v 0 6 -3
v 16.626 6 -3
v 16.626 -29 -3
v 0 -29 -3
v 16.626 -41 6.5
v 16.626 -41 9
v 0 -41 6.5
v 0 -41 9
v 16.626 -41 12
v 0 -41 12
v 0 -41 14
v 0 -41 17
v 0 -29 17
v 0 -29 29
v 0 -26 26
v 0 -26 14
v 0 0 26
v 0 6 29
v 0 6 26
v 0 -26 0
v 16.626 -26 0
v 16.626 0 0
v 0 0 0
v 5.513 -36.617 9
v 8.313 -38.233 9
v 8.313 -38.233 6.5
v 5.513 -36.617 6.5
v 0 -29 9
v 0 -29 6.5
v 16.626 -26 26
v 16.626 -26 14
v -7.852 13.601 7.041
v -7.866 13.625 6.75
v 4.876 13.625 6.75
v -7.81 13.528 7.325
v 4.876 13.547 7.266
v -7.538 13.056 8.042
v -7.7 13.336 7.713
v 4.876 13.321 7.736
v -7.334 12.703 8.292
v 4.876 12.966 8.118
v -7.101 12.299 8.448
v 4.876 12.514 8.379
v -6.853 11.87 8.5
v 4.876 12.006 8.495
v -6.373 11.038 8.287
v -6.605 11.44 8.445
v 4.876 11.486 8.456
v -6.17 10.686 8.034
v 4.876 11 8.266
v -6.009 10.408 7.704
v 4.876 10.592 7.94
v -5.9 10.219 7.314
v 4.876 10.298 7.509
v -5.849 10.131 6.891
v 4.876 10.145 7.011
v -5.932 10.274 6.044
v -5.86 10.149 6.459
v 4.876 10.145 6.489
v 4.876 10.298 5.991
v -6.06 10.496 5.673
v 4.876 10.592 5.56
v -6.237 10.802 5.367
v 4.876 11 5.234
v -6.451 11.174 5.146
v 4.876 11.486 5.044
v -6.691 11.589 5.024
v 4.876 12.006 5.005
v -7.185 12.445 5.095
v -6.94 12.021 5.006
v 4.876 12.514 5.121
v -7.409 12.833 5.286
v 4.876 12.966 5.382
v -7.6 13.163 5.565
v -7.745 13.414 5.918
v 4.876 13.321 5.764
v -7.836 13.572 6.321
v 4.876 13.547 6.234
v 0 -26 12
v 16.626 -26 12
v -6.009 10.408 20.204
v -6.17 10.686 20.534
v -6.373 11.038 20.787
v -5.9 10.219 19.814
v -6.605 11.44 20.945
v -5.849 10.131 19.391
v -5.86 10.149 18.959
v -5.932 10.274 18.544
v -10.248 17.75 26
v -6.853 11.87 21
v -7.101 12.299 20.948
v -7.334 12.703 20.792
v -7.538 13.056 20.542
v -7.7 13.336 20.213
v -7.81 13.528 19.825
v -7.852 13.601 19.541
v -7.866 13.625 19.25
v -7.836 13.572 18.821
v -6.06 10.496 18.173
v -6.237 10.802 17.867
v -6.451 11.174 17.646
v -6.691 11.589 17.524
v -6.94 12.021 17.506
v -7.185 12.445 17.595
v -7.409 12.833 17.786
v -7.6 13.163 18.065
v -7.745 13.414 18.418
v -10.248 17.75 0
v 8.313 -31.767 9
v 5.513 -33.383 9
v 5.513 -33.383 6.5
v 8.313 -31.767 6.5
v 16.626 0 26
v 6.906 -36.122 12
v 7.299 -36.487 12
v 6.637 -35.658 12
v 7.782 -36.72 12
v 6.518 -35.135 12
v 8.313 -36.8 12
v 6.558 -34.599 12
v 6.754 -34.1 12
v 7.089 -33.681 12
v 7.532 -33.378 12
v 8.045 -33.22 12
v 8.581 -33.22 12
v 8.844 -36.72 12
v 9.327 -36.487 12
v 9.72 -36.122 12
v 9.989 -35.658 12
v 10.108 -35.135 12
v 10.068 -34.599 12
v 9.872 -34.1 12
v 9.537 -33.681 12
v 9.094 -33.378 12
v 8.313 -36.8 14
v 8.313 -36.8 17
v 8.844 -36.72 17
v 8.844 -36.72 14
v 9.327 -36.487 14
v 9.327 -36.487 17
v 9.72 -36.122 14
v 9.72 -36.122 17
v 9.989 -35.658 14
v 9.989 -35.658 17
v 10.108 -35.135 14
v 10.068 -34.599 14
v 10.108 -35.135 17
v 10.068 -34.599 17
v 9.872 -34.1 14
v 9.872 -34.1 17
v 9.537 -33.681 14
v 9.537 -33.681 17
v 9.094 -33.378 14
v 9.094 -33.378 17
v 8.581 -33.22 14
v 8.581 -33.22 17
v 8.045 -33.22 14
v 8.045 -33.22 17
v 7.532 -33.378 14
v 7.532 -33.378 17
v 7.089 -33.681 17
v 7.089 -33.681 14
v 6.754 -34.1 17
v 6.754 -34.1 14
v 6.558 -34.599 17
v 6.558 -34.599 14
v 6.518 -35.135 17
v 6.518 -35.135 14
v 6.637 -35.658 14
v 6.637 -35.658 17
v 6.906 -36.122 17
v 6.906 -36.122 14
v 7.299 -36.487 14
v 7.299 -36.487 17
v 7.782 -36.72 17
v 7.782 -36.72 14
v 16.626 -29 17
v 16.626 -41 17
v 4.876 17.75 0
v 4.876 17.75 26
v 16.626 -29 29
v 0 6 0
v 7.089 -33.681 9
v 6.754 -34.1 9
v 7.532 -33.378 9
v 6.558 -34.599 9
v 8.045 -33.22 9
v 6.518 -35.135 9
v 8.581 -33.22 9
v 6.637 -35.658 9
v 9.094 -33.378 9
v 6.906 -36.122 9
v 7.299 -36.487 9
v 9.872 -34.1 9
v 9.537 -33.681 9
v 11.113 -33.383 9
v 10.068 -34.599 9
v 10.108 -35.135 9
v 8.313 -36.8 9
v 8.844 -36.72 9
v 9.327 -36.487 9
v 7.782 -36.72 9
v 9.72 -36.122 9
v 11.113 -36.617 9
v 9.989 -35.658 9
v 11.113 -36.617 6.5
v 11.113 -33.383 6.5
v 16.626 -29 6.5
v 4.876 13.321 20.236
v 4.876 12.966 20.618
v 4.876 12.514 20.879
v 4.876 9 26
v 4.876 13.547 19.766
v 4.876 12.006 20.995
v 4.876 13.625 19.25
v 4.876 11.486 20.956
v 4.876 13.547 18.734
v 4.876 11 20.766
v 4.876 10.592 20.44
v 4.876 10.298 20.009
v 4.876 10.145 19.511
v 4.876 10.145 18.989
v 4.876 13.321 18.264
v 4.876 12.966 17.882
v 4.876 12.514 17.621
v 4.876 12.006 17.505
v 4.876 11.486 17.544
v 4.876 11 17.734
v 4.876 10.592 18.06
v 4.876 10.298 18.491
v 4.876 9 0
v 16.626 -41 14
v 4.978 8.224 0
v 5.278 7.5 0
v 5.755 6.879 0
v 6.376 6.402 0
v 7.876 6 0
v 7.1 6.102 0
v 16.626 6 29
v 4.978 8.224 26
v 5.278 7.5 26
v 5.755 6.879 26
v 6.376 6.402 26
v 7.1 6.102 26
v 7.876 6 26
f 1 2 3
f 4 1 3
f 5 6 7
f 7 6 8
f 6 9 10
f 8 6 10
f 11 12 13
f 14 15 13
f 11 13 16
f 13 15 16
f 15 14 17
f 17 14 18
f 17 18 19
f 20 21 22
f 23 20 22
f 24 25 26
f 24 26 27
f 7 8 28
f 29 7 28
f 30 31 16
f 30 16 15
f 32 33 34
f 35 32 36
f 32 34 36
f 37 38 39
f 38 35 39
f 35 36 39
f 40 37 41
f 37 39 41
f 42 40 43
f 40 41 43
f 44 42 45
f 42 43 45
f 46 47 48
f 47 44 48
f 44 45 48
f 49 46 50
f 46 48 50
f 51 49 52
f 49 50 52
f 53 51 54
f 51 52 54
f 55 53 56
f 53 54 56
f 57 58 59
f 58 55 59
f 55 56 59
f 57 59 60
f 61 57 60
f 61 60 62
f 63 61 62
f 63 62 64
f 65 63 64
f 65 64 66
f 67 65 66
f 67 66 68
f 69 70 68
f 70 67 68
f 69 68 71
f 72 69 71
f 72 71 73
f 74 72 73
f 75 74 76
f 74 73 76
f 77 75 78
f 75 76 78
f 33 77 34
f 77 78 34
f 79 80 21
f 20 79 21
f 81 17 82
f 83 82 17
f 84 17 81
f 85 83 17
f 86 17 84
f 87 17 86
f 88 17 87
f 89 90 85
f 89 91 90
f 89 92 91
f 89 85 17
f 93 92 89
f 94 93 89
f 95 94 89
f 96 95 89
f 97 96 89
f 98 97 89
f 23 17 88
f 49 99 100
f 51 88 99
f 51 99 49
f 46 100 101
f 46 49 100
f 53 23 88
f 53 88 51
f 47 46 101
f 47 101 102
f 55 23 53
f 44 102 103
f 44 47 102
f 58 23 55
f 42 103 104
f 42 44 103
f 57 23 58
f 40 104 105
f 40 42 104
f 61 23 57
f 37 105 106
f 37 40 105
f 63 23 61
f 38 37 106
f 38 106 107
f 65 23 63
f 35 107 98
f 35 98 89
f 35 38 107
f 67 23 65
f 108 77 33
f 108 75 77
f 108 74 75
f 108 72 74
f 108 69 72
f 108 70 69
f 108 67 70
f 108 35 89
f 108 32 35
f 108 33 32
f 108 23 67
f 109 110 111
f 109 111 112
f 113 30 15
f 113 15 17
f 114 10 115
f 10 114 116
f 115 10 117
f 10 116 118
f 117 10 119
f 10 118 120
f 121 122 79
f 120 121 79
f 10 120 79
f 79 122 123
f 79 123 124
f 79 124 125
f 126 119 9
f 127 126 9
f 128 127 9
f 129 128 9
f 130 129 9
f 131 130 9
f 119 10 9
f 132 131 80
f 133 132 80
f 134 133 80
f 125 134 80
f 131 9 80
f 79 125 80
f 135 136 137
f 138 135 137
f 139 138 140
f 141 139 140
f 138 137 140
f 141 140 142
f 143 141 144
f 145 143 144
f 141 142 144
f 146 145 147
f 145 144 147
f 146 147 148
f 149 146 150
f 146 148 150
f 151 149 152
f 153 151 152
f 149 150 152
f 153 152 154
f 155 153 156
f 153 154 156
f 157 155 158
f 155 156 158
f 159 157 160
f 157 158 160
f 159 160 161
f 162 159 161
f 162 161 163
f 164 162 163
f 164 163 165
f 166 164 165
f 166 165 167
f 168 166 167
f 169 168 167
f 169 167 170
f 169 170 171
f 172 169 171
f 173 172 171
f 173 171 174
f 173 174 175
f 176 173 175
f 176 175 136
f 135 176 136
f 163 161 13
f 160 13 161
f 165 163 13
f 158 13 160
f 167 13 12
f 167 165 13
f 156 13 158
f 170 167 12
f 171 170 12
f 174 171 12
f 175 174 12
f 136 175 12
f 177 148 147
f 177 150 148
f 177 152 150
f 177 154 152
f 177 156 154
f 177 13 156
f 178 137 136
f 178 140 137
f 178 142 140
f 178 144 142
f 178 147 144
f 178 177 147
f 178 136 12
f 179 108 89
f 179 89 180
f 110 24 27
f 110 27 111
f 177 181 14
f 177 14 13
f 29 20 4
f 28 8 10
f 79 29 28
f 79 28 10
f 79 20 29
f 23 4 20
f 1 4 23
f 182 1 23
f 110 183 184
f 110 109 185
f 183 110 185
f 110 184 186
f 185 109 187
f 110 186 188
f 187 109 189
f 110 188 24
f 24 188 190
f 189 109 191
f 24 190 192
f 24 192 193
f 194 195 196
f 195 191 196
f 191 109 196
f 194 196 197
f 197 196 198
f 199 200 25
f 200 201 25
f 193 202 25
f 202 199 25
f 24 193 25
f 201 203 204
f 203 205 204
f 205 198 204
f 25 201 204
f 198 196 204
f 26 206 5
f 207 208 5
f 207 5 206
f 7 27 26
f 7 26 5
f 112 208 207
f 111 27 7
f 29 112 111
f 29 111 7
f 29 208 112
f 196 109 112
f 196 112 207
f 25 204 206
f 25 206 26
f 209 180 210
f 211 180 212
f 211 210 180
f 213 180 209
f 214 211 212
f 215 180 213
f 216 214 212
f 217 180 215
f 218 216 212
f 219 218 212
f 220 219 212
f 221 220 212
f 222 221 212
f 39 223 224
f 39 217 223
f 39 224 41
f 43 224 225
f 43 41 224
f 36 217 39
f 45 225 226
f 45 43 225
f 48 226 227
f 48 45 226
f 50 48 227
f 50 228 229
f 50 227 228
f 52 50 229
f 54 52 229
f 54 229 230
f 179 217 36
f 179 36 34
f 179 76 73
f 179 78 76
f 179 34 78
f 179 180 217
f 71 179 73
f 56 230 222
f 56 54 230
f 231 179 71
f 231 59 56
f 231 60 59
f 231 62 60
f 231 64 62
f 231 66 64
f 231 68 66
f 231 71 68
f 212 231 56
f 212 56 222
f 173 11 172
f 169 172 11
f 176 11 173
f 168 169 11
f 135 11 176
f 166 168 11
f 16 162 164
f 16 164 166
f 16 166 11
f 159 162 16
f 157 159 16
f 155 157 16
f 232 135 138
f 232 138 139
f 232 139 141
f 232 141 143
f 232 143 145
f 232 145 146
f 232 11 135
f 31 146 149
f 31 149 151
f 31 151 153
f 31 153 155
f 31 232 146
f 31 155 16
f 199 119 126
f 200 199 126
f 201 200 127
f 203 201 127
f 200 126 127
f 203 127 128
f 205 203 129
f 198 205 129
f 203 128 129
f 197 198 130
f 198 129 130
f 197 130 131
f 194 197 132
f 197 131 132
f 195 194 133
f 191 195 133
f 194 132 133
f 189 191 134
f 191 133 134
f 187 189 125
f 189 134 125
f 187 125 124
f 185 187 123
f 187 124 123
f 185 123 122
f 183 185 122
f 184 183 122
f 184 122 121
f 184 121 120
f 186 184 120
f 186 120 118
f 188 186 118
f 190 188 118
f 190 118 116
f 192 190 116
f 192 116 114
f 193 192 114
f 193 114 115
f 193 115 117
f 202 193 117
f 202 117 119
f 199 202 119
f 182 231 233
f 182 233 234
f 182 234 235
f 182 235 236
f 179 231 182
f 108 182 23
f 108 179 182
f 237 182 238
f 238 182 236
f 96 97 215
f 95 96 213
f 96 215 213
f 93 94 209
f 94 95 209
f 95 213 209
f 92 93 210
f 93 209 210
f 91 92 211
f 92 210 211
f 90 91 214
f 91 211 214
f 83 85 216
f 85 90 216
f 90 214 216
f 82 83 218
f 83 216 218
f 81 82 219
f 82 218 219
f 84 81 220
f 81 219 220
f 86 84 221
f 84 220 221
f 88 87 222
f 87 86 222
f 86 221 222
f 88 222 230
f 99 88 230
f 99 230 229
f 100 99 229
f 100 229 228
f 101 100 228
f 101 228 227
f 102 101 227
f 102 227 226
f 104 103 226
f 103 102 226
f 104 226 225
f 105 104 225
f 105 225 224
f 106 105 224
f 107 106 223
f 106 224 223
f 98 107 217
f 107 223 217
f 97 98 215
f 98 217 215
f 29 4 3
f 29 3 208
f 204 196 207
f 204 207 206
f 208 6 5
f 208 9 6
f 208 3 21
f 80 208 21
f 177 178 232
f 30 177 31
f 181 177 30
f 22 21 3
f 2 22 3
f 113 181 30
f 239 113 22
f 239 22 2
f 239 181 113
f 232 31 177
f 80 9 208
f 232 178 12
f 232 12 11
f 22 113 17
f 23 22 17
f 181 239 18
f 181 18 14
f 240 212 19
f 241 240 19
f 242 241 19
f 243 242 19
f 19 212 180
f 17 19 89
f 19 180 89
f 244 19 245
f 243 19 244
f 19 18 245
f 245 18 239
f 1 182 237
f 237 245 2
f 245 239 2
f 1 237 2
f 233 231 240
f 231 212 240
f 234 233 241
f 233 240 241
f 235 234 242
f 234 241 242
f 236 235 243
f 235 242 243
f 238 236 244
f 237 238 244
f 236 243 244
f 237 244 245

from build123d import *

# Parameters (mm, degrees)
BOSS_EXTRUDE1_DEPTH = 26
SKETCH3_R           = 1.75
CUT_EXTRUDE2_DEPTH  = 35.925597792
FILLET1_R           = 3
BOSS_EXTRUDE2_DEPTH = 16.626016
SKETCH5_R           = 1.8
CUT_EXTRUDE3_DEPTH  = 49.553315232
SKETCH6_W           = 16.626016361
SKETCH6_H           = 12
BOSS_EXTRUDE3_DEPTH = 2.5


with BuildPart() as part:
    # Sketch1 → Boss-Extrude1 (new body)
    with BuildSketch(Plane.XY):
        Polygon((0, 0), (-10.247967278, 17.75), (4.876016361, 17.75), (4.876016361, 6), (16.626016361, 6), (16.626016361, 0), align=None)
    extrude(amount=BOSS_EXTRUDE1_DEPTH)

    # Sketch3 → Cut-Extrude2 (cut, through all)
    with BuildSketch(Plane(origin=(4.876016361, 0, 0), x_dir=(0, 0, -1), z_dir=(1, 0, 0))):
        with Locations(Location((-19.25, 11.875, 0), (0, 0, 90))):
            Circle(SKETCH3_R)
        with Locations(Location((-6.75, 11.875, 0), (0, 0, 90))):
            Circle(SKETCH3_R)
    extrude(amount=-CUT_EXTRUDE2_DEPTH, mode=Mode.SUBTRACT)

    # Fillet1
    fillet1_edges = [part.edges().sort_by_distance(p)[0] for p in [
        (4.876016361, 6, 13),
    ]]
    fillet(fillet1_edges, radius=FILLET1_R)

    # Sketch4 → Boss-Extrude2 (add)
    with BuildSketch(Plane(origin=(16.626016361, 0, 0), x_dir=(0, 0, -1), z_dir=(1, 0, 0))):
        Polygon((-26, 6), (-29, 6), (-29, -29), (-17, -29), (-17, -41), (-14, -41), (-14, -26), (-26, -26), (-26, 0), align=None)
    boss_extrude2 = extrude(amount=-BOSS_EXTRUDE2_DEPTH)

    # Mirror1: Boss-Extrude2 across plane
    add(boss_extrude2.mirror(Plane(origin=(0, 0, 13), x_dir=(1, 0, 0), z_dir=(0, 0, -1))))

    # Sketch5 → Cut-Extrude3 (cut, through all)
    with BuildSketch(Plane.XY.offset(17)):
        with Locations(Location((8.31300818, -35, 0), (0, 0, 270))):
            Circle(SKETCH5_R)
    extrude(amount=-CUT_EXTRUDE3_DEPTH, mode=Mode.SUBTRACT)

    # Sketch6 → Boss-Extrude3 (add)
    with BuildSketch(Plane(origin=(0, 0, 9), x_dir=(-1, 0, 0), z_dir=(0, 0, -1))):
        with Locations((-8.313008181, -35)):
            Rectangle(SKETCH6_W, SKETCH6_H)
        Polygon((-5.51300818, -33.383419246), (-8.31300818, -31.766838493), (-11.11300818, -33.383419246), (-11.11300818, -36.616580754), (-8.31300818, -38.233161507), (-5.51300818, -36.616580754), align=None, mode=Mode.SUBTRACT)
    extrude(amount=BOSS_EXTRUDE3_DEPTH)


solid = part.part
